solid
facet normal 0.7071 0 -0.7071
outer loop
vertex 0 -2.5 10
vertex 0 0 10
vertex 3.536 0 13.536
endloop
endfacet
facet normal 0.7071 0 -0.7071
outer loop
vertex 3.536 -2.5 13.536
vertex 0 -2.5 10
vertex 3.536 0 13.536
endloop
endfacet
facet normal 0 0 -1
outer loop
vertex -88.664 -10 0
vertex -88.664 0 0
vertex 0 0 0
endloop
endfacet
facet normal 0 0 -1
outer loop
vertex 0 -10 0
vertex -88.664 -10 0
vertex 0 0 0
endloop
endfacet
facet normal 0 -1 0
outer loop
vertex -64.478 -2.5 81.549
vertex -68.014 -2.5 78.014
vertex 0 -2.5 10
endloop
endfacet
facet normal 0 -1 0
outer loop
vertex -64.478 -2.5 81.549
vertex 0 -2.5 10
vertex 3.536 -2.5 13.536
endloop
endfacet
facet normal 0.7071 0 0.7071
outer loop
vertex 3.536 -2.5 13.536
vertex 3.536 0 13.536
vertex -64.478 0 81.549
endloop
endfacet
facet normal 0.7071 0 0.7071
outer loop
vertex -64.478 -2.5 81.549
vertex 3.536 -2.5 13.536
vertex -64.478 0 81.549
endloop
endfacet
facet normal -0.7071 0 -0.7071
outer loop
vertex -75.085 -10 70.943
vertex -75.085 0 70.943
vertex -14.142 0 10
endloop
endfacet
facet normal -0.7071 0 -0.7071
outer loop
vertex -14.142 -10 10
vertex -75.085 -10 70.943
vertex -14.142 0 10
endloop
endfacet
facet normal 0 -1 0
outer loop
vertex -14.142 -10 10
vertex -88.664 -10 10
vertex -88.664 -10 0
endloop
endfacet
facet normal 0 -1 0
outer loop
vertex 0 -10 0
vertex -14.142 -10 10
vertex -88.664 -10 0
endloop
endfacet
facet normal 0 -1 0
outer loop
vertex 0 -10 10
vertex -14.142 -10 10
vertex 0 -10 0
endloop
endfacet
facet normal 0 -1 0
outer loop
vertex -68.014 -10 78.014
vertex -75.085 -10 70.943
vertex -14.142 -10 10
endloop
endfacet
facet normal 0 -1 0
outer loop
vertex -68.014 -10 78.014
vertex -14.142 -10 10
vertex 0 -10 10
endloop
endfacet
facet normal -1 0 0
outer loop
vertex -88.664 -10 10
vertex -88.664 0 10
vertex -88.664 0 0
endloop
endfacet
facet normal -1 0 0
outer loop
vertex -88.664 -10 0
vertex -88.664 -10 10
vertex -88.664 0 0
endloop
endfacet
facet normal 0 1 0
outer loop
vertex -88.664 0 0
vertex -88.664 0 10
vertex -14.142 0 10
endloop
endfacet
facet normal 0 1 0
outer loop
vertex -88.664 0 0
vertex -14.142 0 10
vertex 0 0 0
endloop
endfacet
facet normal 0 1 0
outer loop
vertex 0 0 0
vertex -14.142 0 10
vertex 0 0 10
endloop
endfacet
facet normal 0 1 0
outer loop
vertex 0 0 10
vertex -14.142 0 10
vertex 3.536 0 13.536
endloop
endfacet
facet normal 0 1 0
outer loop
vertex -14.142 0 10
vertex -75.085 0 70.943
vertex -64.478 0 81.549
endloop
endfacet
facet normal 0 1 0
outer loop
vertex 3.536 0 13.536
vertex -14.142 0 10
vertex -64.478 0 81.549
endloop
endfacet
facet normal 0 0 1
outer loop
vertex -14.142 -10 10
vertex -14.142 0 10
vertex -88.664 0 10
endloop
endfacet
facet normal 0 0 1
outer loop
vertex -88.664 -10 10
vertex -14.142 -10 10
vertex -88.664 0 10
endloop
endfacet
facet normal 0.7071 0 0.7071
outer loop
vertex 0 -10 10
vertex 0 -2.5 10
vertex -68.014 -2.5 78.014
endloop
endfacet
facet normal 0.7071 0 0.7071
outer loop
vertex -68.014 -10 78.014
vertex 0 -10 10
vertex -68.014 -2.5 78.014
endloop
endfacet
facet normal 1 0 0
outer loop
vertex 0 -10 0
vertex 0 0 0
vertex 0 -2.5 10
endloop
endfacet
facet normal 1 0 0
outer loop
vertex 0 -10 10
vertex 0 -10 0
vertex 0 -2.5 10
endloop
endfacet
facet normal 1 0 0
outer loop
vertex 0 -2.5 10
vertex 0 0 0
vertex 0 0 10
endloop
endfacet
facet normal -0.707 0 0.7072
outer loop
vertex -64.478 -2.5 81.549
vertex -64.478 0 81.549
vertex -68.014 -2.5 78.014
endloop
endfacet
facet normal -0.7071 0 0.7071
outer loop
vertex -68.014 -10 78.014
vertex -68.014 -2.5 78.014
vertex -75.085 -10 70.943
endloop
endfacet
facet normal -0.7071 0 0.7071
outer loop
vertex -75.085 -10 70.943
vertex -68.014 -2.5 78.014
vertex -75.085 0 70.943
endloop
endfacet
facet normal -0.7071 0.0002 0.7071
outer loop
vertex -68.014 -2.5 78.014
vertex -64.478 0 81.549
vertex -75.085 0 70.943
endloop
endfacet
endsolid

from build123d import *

# Parameters (mm, degrees)
F1_DEPTH = 10
F2_DEPTH = 2.5


with BuildPart() as f1:
    # F0 (on Front) → F1 (new body)
    with BuildSketch(Plane.XZ):
        Polygon((-88.664238, 0), (0, 0), (0, 10), (-14.142136, 10), (-88.664238, 10), align=None)
        Polygon((-14.142136, 10), (0, 10), (-68.013943, 78.013943), (-75.085011, 70.942875), align=None)
    extrude(amount=F1_DEPTH)

    # F0 (on Front) → F2 (join)
    with BuildSketch(Plane.XZ):
        Polygon((-68.013943, 78.013943), (0, 10), (3.535534, 13.535534), (-64.478409, 81.549477), align=None)
    extrude(amount=F2_DEPTH)


solid = f1.part
